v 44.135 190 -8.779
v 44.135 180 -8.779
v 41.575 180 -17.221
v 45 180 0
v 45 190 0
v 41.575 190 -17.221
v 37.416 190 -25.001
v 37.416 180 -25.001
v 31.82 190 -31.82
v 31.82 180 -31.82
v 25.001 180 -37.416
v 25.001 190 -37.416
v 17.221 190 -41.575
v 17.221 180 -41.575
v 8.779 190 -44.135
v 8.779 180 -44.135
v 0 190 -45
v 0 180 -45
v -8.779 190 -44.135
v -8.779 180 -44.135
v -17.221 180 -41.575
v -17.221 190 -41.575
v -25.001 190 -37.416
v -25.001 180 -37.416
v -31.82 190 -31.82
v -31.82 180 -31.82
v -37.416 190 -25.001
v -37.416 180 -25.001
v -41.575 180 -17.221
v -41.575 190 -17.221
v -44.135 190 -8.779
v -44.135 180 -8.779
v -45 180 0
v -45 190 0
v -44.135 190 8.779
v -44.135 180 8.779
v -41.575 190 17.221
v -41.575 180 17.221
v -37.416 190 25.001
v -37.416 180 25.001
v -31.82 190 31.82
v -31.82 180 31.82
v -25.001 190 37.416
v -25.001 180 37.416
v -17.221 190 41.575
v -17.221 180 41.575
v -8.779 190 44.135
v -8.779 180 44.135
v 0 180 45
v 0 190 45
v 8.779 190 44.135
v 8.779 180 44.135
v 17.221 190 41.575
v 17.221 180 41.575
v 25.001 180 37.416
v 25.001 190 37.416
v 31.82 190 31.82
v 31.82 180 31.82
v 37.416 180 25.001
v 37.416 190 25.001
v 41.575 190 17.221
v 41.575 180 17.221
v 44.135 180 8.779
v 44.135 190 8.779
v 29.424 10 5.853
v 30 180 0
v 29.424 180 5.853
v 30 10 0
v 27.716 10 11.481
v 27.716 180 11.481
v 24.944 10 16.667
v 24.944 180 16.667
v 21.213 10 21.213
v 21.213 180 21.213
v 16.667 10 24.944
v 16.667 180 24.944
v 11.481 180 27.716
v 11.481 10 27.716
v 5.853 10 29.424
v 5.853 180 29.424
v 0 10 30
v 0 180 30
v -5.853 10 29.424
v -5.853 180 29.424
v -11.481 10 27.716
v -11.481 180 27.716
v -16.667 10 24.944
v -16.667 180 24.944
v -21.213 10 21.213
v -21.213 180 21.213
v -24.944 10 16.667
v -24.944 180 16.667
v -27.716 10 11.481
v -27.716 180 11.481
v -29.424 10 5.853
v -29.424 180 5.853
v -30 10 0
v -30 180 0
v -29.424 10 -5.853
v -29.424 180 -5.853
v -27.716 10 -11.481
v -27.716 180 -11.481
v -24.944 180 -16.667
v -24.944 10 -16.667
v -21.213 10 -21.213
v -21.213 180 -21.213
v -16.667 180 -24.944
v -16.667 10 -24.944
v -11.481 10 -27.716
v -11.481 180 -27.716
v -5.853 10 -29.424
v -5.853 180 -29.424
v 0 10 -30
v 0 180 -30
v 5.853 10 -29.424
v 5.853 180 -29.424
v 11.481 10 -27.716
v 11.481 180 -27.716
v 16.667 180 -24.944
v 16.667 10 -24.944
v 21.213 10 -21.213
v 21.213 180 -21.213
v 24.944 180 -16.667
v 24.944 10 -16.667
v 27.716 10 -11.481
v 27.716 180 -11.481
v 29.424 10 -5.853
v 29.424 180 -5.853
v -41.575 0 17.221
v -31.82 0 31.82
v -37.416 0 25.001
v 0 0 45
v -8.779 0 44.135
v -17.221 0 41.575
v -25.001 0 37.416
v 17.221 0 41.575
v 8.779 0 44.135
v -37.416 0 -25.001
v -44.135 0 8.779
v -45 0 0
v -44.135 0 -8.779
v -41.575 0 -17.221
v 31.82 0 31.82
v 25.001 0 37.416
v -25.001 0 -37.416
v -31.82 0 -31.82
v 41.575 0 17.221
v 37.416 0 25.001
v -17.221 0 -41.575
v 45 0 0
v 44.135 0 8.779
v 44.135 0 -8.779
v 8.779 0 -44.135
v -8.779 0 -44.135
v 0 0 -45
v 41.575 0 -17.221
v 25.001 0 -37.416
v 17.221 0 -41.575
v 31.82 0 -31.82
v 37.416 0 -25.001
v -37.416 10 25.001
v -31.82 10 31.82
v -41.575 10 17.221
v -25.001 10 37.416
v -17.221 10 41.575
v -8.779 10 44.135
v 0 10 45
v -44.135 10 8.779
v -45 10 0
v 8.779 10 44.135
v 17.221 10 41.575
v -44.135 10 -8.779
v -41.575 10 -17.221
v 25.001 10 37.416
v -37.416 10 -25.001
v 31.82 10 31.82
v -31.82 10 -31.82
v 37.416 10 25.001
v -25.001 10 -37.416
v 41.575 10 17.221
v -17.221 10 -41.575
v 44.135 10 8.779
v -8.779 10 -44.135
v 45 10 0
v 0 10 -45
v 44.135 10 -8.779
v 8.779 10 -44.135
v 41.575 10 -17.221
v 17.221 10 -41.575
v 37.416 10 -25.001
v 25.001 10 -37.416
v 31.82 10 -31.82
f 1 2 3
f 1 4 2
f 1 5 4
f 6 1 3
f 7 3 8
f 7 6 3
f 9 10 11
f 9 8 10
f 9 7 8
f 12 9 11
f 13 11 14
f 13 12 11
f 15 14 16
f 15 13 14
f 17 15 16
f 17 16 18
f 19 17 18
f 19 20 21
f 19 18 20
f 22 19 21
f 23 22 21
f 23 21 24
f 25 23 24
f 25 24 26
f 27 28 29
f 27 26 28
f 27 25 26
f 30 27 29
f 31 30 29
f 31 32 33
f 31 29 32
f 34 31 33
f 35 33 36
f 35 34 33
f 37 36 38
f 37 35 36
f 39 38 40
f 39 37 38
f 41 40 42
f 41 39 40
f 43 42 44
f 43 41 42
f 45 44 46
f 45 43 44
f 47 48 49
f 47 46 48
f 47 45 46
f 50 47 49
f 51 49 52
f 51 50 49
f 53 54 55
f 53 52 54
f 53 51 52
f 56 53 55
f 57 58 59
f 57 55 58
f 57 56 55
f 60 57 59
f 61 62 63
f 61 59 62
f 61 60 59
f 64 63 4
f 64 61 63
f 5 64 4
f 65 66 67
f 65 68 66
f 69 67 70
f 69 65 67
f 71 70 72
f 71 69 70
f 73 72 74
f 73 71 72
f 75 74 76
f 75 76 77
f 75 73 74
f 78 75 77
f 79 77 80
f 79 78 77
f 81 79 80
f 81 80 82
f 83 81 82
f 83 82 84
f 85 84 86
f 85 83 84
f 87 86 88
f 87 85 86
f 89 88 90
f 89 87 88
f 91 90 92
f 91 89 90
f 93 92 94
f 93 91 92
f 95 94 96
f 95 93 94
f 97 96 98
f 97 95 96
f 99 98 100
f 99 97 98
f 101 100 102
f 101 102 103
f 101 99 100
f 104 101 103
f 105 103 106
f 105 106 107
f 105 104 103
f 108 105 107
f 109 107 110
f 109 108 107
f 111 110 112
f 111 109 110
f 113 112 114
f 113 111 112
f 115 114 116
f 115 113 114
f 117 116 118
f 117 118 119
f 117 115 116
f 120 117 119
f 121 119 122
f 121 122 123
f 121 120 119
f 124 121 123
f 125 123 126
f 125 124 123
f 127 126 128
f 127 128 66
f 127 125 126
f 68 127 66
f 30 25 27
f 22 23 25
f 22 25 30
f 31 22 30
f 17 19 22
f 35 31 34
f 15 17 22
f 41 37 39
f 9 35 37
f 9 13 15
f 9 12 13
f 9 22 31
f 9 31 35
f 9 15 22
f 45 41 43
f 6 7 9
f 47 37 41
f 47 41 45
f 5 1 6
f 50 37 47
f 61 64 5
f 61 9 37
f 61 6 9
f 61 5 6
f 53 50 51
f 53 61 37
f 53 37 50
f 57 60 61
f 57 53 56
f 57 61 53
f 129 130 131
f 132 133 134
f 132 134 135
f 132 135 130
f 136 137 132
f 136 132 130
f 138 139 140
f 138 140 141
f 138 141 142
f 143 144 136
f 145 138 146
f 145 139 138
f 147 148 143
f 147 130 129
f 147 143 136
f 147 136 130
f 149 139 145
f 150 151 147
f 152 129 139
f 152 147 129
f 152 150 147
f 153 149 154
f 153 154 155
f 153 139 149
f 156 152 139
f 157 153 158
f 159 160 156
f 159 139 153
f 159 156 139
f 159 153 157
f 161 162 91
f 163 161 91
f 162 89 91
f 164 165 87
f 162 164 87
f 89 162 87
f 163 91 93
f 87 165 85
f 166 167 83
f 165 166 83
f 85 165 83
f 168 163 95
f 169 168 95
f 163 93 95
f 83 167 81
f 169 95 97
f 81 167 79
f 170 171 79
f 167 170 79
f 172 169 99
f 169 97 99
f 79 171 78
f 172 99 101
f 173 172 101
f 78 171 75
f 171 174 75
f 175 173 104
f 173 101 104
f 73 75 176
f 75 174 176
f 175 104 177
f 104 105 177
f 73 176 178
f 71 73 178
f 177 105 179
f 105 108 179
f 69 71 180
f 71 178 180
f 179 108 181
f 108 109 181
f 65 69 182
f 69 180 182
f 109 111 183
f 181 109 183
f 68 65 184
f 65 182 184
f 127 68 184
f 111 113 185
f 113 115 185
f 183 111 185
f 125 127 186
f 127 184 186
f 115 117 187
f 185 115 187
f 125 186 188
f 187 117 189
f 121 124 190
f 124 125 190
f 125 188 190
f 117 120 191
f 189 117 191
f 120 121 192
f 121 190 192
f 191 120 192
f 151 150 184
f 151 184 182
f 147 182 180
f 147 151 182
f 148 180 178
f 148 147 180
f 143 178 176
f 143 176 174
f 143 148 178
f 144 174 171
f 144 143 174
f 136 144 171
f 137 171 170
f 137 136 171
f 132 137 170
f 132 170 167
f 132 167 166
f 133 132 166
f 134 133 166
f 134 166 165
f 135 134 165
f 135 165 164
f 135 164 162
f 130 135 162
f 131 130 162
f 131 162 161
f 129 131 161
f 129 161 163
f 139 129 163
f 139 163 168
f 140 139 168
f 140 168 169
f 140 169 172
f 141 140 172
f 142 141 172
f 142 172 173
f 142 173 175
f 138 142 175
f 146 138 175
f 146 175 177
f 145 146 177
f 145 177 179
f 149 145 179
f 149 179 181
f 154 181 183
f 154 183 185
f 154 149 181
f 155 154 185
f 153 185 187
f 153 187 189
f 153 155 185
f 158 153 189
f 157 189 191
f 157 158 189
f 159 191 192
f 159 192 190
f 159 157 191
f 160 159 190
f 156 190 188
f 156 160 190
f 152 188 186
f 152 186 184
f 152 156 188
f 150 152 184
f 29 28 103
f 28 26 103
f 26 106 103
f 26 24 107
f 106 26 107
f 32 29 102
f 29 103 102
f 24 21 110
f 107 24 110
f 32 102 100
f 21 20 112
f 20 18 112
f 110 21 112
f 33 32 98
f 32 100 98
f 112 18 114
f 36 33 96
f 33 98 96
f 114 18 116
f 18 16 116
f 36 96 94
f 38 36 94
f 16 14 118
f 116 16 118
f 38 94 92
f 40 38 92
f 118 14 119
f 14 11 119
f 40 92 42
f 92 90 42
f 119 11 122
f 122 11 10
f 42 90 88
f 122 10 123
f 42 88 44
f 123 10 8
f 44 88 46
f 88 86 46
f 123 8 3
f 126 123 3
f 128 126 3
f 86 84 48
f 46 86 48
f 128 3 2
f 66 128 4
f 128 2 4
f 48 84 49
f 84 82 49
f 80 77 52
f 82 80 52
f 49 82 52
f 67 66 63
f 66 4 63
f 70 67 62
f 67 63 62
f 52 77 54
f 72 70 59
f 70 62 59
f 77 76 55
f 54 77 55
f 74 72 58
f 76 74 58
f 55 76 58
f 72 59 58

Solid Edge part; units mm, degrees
sketch "Sketch1" plane through (0, 0, 0) normal (0, -1, 0) x (1, 0, 0)
  circle A0 centre (0, 0) radius 30
extrude "Protrusion1" add sketch "Sketch1" against normal blind 190
sketch "Sketch2" plane through (0, 0, 0) normal (0, -1, 0) x (1, 0, 0)
  circle A0 centre (0, 0) radius 45
  dimension "D1" = 90
extrude "ExtrudedProtrusion_2" add sketch "Sketch2" against normal blind 10
mirror "Mirror1" about plane through (0, 95, 0) normal (0, -1, 0) of "ExtrudedProtrusion_2"
